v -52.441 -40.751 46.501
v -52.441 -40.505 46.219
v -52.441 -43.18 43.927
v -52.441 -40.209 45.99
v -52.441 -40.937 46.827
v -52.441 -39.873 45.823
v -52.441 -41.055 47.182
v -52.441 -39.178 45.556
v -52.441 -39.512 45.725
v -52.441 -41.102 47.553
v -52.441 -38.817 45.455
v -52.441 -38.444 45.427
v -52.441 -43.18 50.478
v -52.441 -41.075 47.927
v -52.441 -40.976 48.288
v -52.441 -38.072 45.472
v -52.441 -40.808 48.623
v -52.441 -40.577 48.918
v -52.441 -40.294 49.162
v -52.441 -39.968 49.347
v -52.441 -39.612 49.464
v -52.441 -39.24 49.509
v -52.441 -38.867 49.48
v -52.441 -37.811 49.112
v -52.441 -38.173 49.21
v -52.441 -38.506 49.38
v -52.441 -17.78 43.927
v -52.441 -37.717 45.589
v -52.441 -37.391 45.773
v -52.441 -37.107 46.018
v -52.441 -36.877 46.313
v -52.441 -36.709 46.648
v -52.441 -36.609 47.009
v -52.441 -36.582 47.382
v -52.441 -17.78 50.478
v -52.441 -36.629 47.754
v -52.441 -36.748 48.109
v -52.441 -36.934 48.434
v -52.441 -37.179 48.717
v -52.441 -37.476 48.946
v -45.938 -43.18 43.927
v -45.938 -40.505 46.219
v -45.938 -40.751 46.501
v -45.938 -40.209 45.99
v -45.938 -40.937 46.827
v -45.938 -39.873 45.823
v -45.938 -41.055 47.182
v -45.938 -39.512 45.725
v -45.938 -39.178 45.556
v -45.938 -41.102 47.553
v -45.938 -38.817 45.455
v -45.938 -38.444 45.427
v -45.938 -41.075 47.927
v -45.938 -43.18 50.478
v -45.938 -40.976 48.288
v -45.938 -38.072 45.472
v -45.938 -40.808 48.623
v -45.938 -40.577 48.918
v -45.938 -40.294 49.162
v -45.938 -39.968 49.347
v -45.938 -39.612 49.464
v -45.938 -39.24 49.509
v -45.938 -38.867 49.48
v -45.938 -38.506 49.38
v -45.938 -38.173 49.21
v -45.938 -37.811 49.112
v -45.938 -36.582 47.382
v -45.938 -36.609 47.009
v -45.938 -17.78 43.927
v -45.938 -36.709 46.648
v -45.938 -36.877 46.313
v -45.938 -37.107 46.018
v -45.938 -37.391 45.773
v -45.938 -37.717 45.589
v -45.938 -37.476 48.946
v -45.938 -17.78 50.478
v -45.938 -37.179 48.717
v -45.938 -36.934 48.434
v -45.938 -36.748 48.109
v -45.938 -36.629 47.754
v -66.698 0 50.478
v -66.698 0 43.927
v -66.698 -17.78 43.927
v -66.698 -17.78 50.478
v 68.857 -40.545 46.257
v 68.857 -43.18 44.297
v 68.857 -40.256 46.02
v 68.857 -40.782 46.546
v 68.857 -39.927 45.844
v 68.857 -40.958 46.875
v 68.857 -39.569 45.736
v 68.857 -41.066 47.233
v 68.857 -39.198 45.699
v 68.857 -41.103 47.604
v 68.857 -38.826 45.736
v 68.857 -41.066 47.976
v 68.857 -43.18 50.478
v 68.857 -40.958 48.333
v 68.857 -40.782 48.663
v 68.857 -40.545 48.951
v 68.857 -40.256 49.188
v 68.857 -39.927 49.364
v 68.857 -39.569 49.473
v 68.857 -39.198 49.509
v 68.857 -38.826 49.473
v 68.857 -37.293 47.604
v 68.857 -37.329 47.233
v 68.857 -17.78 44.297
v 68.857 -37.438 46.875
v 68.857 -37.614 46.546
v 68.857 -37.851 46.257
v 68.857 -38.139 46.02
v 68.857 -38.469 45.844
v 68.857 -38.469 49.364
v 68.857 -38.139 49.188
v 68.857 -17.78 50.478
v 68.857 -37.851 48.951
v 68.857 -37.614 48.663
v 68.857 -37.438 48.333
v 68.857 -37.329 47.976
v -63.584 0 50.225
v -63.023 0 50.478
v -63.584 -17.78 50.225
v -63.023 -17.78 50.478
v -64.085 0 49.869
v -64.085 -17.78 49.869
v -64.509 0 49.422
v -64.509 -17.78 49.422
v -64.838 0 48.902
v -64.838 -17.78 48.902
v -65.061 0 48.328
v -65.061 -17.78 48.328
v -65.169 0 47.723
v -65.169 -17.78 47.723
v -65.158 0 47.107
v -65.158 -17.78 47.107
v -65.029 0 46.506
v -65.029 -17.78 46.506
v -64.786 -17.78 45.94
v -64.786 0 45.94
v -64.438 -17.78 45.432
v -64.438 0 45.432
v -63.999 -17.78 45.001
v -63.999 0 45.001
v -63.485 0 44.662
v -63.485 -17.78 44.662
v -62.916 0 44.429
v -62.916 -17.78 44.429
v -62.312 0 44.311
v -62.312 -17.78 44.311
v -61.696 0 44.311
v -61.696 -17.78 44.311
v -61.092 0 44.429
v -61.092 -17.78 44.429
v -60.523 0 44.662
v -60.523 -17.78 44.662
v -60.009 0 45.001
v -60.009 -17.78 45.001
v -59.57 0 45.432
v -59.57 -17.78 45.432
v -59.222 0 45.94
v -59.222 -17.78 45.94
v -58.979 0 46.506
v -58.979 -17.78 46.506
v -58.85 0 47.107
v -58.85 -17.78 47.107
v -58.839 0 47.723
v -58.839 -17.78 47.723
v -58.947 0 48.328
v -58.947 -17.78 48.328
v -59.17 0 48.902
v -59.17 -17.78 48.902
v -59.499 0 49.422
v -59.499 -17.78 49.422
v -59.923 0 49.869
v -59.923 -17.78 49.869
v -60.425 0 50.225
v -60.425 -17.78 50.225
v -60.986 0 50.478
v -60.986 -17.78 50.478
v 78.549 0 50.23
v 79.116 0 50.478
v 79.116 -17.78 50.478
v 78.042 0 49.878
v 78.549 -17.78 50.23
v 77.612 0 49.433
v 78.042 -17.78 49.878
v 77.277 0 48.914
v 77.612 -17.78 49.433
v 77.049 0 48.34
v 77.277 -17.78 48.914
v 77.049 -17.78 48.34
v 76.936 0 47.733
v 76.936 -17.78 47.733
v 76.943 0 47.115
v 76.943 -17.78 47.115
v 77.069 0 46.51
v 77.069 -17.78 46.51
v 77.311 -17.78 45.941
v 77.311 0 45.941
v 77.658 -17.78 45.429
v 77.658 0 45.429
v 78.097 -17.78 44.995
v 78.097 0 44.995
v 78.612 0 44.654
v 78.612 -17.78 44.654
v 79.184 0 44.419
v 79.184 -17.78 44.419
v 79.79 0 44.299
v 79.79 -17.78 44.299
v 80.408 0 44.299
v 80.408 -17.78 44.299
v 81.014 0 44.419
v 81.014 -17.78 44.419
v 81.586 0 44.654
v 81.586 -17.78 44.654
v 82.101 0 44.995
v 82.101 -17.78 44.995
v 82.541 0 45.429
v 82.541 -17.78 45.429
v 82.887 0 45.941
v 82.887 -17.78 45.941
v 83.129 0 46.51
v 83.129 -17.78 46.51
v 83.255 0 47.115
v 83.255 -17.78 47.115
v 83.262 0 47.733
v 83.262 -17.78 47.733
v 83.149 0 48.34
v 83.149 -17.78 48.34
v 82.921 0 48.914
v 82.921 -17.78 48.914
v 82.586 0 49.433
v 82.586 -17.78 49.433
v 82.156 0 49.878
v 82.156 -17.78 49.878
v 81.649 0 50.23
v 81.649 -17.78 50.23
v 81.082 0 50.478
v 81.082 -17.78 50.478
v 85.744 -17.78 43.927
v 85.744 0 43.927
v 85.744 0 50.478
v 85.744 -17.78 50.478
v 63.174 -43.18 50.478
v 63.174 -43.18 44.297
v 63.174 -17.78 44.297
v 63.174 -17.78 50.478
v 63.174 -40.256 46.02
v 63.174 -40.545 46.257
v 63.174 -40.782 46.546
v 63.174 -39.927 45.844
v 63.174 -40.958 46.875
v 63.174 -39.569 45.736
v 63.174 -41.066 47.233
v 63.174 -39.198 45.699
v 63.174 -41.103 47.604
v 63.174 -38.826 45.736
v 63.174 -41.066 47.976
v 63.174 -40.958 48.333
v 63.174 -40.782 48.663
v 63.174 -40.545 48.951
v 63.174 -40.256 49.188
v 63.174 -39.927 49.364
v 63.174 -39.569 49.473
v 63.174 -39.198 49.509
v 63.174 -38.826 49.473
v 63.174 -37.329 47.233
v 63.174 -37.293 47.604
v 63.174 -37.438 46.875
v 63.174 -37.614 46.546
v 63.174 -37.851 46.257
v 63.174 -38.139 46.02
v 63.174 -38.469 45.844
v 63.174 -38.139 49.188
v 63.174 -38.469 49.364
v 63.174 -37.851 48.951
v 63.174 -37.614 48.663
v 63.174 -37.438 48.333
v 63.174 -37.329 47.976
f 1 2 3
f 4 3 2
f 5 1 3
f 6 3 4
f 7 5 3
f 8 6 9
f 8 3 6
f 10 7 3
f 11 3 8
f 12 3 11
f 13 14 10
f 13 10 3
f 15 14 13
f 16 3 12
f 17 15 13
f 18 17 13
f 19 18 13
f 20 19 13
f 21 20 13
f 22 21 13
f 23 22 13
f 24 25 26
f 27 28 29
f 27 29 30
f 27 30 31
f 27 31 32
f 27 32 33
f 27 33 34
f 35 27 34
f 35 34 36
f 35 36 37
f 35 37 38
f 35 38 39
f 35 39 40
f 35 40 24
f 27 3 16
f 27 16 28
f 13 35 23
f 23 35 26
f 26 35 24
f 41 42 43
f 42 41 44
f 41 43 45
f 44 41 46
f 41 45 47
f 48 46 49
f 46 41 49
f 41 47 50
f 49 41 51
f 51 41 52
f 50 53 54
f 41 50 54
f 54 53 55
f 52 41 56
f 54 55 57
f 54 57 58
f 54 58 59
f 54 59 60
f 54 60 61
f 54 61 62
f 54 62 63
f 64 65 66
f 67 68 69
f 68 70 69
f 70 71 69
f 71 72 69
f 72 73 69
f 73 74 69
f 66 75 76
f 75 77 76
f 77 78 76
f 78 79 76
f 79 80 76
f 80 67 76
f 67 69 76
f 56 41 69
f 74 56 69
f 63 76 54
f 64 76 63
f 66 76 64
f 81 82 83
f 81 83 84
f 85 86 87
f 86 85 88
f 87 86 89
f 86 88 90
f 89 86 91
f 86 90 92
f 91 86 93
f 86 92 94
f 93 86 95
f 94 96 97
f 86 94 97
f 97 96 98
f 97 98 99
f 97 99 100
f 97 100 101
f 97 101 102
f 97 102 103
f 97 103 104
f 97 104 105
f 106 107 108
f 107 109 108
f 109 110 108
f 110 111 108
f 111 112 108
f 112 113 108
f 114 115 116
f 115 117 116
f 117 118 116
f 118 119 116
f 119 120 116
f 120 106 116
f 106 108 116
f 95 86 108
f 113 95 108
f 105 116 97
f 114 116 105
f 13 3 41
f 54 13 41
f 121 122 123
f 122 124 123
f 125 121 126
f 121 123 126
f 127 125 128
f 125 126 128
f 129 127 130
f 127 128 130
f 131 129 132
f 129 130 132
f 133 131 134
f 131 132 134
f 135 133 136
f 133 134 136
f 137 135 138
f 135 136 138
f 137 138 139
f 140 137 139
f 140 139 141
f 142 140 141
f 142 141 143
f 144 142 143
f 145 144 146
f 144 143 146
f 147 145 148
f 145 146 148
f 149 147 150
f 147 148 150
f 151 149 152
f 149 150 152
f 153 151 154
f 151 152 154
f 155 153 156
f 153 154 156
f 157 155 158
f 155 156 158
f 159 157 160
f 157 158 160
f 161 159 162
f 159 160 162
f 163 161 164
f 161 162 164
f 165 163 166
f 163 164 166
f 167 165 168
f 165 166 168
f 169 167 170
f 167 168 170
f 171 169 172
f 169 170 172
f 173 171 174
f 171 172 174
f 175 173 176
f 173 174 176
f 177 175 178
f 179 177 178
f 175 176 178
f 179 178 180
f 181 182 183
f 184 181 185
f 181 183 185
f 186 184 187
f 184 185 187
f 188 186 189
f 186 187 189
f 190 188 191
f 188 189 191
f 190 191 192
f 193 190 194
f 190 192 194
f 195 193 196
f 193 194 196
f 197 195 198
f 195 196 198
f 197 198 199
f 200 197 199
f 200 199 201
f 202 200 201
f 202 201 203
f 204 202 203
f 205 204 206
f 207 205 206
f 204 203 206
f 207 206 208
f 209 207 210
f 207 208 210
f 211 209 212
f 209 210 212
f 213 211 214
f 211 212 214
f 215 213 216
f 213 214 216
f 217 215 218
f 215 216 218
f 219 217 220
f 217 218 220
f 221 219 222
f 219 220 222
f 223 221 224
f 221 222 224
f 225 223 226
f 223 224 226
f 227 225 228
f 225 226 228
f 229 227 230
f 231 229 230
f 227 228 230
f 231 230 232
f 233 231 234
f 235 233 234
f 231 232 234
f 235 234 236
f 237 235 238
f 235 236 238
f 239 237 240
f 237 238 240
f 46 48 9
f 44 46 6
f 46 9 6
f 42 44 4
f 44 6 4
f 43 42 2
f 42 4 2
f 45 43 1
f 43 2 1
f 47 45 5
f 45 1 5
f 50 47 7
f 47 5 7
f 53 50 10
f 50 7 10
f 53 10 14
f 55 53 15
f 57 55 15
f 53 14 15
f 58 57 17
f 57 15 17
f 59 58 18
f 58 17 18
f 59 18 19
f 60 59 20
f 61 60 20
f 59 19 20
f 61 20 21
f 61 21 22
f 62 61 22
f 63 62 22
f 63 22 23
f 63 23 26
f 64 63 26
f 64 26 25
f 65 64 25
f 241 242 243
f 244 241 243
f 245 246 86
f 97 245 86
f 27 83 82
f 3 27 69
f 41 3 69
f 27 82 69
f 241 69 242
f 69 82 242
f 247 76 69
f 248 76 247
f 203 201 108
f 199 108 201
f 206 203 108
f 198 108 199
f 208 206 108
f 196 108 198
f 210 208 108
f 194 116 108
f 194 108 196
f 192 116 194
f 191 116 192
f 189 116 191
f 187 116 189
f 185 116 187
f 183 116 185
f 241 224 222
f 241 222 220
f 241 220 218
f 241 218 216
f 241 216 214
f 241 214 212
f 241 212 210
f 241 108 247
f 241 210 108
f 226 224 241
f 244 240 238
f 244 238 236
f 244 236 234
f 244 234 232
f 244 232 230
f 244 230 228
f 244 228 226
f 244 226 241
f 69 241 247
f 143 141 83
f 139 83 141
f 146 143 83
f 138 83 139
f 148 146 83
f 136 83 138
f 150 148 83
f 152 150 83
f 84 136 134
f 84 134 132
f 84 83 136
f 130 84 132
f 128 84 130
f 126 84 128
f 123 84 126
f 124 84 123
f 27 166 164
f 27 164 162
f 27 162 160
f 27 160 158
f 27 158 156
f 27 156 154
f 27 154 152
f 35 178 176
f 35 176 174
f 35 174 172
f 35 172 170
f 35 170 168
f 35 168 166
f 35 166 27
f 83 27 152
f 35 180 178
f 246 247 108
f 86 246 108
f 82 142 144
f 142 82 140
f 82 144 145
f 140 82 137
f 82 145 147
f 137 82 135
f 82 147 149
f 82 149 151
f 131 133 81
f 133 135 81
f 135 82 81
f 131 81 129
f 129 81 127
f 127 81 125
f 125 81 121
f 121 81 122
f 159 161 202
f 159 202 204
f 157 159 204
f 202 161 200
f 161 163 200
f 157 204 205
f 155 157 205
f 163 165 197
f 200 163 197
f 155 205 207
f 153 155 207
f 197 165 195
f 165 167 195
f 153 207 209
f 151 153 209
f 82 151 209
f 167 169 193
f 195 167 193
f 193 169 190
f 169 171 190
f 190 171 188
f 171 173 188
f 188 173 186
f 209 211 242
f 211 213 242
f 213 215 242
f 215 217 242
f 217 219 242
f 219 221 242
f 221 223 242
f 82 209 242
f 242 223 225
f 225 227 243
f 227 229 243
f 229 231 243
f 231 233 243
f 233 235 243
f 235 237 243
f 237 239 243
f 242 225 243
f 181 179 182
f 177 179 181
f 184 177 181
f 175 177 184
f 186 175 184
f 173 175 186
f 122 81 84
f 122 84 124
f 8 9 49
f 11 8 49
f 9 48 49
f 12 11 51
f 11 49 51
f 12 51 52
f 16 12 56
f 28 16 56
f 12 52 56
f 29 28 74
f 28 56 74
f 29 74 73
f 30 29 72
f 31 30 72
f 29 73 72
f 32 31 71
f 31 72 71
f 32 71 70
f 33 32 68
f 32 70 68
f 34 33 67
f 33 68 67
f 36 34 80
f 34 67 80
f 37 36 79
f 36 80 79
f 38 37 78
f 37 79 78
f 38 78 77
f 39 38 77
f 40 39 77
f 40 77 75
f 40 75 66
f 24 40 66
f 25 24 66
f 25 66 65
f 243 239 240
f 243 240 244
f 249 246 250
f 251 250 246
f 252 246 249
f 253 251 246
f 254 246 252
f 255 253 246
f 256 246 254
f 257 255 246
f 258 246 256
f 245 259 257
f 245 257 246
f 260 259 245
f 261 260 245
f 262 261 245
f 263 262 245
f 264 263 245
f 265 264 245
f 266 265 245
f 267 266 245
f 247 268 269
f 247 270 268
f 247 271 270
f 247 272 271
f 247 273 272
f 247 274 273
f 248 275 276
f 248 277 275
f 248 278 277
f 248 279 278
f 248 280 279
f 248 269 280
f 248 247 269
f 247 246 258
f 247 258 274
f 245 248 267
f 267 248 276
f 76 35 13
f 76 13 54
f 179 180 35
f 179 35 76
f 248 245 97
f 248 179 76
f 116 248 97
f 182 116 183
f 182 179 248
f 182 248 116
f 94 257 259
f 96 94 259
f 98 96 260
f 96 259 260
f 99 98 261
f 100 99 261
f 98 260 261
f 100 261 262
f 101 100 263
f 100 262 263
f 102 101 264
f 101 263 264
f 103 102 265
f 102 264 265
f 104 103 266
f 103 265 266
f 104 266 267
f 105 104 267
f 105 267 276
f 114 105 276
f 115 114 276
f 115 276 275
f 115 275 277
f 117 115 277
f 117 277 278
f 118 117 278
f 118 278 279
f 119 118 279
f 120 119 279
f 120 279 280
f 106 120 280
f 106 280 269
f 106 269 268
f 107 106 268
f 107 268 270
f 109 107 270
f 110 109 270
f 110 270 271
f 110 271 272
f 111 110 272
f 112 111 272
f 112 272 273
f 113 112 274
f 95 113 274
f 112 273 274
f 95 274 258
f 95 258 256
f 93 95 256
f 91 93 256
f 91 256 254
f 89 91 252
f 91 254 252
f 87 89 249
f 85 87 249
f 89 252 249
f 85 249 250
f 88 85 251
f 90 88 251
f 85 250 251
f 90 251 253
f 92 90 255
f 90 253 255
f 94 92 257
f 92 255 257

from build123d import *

# Parameters (mm, degrees)
F0_W       = 152.4421870708
F0_H       = 6.5507292747
F3_DEPTH   = 17.78
F4_D       = 6.35
F4_ON_F2_D = 6.35
F6_W       = 5.683042109
F6_H       = 6.1811245978
F7_DEPTH   = 25.4
F5_W       = 6.5025947988
F5_H       = 6.5507292747
F8_DEPTH   = 25.4
F10_D      = 3.81
F10_DEPTH  = 12.7
F10_TIP    = 1.1446394792
F12_D      = 3.81


with BuildPart() as f3:
    # F0 (on Front) → F3 (new body)
    with BuildSketch(Plane.XZ):
        with Locations((9.5233023167, 47.2025945783)):
            Rectangle(F0_W, F0_H)
    extrude(amount=F3_DEPTH)

    # F4 (through all)
    with Locations(Plane(origin=(0, 0, 0), x_dir=(1, 0, 0), z_dir=(0, 1, 0))):
        with Locations((-62.0040521026, -47.4707409739)):
            Hole(F4_D / 2)

    # F4 on F2 (through all)
    with Locations(Plane(origin=(0, 0, 0), x_dir=(1, 0, 0), z_dir=(0, 1, 0))):
        with Locations((80.0990313292, -47.4590882659)):
            Hole(F4_ON_F2_D / 2)

    # F6 (on face) → F7 (join)
    with BuildSketch(Plane.XZ.offset(17.78)):
        with Locations((66.0152845085, 47.3873969167)):
            Rectangle(F6_W, F6_H)
    extrude(amount=F7_DEPTH)

    # F5 (on face) → F8 (join)
    with BuildSketch(Plane.XZ.offset(17.78)):
        with Locations((-49.1894576699, 47.2025945783)):
            Rectangle(F5_W, F5_H)
    extrude(amount=F8_DEPTH)

    # F10
    with Locations(Plane(origin=(-52.4407550693, 0, 0), x_dir=(0, -1, 0), z_dir=(-1, 0, 0))):
        with Locations((38.4867973626, 47.3310947418)):
            Hole(F10_D / 2, depth=F10_DEPTH)
            with Locations((0, 0, -(F10_DEPTH + F10_TIP / 2))):  # 118° drill point
                Cone(0, F10_D / 2, F10_TIP, mode=Mode.SUBTRACT)

    # F12 (through all)
    with Locations(Plane.YZ.offset(68.856805563)):
        with Locations((-39.1976609826, 47.6043485105)):
            Hole(F12_D / 2)


solid = f3.part
